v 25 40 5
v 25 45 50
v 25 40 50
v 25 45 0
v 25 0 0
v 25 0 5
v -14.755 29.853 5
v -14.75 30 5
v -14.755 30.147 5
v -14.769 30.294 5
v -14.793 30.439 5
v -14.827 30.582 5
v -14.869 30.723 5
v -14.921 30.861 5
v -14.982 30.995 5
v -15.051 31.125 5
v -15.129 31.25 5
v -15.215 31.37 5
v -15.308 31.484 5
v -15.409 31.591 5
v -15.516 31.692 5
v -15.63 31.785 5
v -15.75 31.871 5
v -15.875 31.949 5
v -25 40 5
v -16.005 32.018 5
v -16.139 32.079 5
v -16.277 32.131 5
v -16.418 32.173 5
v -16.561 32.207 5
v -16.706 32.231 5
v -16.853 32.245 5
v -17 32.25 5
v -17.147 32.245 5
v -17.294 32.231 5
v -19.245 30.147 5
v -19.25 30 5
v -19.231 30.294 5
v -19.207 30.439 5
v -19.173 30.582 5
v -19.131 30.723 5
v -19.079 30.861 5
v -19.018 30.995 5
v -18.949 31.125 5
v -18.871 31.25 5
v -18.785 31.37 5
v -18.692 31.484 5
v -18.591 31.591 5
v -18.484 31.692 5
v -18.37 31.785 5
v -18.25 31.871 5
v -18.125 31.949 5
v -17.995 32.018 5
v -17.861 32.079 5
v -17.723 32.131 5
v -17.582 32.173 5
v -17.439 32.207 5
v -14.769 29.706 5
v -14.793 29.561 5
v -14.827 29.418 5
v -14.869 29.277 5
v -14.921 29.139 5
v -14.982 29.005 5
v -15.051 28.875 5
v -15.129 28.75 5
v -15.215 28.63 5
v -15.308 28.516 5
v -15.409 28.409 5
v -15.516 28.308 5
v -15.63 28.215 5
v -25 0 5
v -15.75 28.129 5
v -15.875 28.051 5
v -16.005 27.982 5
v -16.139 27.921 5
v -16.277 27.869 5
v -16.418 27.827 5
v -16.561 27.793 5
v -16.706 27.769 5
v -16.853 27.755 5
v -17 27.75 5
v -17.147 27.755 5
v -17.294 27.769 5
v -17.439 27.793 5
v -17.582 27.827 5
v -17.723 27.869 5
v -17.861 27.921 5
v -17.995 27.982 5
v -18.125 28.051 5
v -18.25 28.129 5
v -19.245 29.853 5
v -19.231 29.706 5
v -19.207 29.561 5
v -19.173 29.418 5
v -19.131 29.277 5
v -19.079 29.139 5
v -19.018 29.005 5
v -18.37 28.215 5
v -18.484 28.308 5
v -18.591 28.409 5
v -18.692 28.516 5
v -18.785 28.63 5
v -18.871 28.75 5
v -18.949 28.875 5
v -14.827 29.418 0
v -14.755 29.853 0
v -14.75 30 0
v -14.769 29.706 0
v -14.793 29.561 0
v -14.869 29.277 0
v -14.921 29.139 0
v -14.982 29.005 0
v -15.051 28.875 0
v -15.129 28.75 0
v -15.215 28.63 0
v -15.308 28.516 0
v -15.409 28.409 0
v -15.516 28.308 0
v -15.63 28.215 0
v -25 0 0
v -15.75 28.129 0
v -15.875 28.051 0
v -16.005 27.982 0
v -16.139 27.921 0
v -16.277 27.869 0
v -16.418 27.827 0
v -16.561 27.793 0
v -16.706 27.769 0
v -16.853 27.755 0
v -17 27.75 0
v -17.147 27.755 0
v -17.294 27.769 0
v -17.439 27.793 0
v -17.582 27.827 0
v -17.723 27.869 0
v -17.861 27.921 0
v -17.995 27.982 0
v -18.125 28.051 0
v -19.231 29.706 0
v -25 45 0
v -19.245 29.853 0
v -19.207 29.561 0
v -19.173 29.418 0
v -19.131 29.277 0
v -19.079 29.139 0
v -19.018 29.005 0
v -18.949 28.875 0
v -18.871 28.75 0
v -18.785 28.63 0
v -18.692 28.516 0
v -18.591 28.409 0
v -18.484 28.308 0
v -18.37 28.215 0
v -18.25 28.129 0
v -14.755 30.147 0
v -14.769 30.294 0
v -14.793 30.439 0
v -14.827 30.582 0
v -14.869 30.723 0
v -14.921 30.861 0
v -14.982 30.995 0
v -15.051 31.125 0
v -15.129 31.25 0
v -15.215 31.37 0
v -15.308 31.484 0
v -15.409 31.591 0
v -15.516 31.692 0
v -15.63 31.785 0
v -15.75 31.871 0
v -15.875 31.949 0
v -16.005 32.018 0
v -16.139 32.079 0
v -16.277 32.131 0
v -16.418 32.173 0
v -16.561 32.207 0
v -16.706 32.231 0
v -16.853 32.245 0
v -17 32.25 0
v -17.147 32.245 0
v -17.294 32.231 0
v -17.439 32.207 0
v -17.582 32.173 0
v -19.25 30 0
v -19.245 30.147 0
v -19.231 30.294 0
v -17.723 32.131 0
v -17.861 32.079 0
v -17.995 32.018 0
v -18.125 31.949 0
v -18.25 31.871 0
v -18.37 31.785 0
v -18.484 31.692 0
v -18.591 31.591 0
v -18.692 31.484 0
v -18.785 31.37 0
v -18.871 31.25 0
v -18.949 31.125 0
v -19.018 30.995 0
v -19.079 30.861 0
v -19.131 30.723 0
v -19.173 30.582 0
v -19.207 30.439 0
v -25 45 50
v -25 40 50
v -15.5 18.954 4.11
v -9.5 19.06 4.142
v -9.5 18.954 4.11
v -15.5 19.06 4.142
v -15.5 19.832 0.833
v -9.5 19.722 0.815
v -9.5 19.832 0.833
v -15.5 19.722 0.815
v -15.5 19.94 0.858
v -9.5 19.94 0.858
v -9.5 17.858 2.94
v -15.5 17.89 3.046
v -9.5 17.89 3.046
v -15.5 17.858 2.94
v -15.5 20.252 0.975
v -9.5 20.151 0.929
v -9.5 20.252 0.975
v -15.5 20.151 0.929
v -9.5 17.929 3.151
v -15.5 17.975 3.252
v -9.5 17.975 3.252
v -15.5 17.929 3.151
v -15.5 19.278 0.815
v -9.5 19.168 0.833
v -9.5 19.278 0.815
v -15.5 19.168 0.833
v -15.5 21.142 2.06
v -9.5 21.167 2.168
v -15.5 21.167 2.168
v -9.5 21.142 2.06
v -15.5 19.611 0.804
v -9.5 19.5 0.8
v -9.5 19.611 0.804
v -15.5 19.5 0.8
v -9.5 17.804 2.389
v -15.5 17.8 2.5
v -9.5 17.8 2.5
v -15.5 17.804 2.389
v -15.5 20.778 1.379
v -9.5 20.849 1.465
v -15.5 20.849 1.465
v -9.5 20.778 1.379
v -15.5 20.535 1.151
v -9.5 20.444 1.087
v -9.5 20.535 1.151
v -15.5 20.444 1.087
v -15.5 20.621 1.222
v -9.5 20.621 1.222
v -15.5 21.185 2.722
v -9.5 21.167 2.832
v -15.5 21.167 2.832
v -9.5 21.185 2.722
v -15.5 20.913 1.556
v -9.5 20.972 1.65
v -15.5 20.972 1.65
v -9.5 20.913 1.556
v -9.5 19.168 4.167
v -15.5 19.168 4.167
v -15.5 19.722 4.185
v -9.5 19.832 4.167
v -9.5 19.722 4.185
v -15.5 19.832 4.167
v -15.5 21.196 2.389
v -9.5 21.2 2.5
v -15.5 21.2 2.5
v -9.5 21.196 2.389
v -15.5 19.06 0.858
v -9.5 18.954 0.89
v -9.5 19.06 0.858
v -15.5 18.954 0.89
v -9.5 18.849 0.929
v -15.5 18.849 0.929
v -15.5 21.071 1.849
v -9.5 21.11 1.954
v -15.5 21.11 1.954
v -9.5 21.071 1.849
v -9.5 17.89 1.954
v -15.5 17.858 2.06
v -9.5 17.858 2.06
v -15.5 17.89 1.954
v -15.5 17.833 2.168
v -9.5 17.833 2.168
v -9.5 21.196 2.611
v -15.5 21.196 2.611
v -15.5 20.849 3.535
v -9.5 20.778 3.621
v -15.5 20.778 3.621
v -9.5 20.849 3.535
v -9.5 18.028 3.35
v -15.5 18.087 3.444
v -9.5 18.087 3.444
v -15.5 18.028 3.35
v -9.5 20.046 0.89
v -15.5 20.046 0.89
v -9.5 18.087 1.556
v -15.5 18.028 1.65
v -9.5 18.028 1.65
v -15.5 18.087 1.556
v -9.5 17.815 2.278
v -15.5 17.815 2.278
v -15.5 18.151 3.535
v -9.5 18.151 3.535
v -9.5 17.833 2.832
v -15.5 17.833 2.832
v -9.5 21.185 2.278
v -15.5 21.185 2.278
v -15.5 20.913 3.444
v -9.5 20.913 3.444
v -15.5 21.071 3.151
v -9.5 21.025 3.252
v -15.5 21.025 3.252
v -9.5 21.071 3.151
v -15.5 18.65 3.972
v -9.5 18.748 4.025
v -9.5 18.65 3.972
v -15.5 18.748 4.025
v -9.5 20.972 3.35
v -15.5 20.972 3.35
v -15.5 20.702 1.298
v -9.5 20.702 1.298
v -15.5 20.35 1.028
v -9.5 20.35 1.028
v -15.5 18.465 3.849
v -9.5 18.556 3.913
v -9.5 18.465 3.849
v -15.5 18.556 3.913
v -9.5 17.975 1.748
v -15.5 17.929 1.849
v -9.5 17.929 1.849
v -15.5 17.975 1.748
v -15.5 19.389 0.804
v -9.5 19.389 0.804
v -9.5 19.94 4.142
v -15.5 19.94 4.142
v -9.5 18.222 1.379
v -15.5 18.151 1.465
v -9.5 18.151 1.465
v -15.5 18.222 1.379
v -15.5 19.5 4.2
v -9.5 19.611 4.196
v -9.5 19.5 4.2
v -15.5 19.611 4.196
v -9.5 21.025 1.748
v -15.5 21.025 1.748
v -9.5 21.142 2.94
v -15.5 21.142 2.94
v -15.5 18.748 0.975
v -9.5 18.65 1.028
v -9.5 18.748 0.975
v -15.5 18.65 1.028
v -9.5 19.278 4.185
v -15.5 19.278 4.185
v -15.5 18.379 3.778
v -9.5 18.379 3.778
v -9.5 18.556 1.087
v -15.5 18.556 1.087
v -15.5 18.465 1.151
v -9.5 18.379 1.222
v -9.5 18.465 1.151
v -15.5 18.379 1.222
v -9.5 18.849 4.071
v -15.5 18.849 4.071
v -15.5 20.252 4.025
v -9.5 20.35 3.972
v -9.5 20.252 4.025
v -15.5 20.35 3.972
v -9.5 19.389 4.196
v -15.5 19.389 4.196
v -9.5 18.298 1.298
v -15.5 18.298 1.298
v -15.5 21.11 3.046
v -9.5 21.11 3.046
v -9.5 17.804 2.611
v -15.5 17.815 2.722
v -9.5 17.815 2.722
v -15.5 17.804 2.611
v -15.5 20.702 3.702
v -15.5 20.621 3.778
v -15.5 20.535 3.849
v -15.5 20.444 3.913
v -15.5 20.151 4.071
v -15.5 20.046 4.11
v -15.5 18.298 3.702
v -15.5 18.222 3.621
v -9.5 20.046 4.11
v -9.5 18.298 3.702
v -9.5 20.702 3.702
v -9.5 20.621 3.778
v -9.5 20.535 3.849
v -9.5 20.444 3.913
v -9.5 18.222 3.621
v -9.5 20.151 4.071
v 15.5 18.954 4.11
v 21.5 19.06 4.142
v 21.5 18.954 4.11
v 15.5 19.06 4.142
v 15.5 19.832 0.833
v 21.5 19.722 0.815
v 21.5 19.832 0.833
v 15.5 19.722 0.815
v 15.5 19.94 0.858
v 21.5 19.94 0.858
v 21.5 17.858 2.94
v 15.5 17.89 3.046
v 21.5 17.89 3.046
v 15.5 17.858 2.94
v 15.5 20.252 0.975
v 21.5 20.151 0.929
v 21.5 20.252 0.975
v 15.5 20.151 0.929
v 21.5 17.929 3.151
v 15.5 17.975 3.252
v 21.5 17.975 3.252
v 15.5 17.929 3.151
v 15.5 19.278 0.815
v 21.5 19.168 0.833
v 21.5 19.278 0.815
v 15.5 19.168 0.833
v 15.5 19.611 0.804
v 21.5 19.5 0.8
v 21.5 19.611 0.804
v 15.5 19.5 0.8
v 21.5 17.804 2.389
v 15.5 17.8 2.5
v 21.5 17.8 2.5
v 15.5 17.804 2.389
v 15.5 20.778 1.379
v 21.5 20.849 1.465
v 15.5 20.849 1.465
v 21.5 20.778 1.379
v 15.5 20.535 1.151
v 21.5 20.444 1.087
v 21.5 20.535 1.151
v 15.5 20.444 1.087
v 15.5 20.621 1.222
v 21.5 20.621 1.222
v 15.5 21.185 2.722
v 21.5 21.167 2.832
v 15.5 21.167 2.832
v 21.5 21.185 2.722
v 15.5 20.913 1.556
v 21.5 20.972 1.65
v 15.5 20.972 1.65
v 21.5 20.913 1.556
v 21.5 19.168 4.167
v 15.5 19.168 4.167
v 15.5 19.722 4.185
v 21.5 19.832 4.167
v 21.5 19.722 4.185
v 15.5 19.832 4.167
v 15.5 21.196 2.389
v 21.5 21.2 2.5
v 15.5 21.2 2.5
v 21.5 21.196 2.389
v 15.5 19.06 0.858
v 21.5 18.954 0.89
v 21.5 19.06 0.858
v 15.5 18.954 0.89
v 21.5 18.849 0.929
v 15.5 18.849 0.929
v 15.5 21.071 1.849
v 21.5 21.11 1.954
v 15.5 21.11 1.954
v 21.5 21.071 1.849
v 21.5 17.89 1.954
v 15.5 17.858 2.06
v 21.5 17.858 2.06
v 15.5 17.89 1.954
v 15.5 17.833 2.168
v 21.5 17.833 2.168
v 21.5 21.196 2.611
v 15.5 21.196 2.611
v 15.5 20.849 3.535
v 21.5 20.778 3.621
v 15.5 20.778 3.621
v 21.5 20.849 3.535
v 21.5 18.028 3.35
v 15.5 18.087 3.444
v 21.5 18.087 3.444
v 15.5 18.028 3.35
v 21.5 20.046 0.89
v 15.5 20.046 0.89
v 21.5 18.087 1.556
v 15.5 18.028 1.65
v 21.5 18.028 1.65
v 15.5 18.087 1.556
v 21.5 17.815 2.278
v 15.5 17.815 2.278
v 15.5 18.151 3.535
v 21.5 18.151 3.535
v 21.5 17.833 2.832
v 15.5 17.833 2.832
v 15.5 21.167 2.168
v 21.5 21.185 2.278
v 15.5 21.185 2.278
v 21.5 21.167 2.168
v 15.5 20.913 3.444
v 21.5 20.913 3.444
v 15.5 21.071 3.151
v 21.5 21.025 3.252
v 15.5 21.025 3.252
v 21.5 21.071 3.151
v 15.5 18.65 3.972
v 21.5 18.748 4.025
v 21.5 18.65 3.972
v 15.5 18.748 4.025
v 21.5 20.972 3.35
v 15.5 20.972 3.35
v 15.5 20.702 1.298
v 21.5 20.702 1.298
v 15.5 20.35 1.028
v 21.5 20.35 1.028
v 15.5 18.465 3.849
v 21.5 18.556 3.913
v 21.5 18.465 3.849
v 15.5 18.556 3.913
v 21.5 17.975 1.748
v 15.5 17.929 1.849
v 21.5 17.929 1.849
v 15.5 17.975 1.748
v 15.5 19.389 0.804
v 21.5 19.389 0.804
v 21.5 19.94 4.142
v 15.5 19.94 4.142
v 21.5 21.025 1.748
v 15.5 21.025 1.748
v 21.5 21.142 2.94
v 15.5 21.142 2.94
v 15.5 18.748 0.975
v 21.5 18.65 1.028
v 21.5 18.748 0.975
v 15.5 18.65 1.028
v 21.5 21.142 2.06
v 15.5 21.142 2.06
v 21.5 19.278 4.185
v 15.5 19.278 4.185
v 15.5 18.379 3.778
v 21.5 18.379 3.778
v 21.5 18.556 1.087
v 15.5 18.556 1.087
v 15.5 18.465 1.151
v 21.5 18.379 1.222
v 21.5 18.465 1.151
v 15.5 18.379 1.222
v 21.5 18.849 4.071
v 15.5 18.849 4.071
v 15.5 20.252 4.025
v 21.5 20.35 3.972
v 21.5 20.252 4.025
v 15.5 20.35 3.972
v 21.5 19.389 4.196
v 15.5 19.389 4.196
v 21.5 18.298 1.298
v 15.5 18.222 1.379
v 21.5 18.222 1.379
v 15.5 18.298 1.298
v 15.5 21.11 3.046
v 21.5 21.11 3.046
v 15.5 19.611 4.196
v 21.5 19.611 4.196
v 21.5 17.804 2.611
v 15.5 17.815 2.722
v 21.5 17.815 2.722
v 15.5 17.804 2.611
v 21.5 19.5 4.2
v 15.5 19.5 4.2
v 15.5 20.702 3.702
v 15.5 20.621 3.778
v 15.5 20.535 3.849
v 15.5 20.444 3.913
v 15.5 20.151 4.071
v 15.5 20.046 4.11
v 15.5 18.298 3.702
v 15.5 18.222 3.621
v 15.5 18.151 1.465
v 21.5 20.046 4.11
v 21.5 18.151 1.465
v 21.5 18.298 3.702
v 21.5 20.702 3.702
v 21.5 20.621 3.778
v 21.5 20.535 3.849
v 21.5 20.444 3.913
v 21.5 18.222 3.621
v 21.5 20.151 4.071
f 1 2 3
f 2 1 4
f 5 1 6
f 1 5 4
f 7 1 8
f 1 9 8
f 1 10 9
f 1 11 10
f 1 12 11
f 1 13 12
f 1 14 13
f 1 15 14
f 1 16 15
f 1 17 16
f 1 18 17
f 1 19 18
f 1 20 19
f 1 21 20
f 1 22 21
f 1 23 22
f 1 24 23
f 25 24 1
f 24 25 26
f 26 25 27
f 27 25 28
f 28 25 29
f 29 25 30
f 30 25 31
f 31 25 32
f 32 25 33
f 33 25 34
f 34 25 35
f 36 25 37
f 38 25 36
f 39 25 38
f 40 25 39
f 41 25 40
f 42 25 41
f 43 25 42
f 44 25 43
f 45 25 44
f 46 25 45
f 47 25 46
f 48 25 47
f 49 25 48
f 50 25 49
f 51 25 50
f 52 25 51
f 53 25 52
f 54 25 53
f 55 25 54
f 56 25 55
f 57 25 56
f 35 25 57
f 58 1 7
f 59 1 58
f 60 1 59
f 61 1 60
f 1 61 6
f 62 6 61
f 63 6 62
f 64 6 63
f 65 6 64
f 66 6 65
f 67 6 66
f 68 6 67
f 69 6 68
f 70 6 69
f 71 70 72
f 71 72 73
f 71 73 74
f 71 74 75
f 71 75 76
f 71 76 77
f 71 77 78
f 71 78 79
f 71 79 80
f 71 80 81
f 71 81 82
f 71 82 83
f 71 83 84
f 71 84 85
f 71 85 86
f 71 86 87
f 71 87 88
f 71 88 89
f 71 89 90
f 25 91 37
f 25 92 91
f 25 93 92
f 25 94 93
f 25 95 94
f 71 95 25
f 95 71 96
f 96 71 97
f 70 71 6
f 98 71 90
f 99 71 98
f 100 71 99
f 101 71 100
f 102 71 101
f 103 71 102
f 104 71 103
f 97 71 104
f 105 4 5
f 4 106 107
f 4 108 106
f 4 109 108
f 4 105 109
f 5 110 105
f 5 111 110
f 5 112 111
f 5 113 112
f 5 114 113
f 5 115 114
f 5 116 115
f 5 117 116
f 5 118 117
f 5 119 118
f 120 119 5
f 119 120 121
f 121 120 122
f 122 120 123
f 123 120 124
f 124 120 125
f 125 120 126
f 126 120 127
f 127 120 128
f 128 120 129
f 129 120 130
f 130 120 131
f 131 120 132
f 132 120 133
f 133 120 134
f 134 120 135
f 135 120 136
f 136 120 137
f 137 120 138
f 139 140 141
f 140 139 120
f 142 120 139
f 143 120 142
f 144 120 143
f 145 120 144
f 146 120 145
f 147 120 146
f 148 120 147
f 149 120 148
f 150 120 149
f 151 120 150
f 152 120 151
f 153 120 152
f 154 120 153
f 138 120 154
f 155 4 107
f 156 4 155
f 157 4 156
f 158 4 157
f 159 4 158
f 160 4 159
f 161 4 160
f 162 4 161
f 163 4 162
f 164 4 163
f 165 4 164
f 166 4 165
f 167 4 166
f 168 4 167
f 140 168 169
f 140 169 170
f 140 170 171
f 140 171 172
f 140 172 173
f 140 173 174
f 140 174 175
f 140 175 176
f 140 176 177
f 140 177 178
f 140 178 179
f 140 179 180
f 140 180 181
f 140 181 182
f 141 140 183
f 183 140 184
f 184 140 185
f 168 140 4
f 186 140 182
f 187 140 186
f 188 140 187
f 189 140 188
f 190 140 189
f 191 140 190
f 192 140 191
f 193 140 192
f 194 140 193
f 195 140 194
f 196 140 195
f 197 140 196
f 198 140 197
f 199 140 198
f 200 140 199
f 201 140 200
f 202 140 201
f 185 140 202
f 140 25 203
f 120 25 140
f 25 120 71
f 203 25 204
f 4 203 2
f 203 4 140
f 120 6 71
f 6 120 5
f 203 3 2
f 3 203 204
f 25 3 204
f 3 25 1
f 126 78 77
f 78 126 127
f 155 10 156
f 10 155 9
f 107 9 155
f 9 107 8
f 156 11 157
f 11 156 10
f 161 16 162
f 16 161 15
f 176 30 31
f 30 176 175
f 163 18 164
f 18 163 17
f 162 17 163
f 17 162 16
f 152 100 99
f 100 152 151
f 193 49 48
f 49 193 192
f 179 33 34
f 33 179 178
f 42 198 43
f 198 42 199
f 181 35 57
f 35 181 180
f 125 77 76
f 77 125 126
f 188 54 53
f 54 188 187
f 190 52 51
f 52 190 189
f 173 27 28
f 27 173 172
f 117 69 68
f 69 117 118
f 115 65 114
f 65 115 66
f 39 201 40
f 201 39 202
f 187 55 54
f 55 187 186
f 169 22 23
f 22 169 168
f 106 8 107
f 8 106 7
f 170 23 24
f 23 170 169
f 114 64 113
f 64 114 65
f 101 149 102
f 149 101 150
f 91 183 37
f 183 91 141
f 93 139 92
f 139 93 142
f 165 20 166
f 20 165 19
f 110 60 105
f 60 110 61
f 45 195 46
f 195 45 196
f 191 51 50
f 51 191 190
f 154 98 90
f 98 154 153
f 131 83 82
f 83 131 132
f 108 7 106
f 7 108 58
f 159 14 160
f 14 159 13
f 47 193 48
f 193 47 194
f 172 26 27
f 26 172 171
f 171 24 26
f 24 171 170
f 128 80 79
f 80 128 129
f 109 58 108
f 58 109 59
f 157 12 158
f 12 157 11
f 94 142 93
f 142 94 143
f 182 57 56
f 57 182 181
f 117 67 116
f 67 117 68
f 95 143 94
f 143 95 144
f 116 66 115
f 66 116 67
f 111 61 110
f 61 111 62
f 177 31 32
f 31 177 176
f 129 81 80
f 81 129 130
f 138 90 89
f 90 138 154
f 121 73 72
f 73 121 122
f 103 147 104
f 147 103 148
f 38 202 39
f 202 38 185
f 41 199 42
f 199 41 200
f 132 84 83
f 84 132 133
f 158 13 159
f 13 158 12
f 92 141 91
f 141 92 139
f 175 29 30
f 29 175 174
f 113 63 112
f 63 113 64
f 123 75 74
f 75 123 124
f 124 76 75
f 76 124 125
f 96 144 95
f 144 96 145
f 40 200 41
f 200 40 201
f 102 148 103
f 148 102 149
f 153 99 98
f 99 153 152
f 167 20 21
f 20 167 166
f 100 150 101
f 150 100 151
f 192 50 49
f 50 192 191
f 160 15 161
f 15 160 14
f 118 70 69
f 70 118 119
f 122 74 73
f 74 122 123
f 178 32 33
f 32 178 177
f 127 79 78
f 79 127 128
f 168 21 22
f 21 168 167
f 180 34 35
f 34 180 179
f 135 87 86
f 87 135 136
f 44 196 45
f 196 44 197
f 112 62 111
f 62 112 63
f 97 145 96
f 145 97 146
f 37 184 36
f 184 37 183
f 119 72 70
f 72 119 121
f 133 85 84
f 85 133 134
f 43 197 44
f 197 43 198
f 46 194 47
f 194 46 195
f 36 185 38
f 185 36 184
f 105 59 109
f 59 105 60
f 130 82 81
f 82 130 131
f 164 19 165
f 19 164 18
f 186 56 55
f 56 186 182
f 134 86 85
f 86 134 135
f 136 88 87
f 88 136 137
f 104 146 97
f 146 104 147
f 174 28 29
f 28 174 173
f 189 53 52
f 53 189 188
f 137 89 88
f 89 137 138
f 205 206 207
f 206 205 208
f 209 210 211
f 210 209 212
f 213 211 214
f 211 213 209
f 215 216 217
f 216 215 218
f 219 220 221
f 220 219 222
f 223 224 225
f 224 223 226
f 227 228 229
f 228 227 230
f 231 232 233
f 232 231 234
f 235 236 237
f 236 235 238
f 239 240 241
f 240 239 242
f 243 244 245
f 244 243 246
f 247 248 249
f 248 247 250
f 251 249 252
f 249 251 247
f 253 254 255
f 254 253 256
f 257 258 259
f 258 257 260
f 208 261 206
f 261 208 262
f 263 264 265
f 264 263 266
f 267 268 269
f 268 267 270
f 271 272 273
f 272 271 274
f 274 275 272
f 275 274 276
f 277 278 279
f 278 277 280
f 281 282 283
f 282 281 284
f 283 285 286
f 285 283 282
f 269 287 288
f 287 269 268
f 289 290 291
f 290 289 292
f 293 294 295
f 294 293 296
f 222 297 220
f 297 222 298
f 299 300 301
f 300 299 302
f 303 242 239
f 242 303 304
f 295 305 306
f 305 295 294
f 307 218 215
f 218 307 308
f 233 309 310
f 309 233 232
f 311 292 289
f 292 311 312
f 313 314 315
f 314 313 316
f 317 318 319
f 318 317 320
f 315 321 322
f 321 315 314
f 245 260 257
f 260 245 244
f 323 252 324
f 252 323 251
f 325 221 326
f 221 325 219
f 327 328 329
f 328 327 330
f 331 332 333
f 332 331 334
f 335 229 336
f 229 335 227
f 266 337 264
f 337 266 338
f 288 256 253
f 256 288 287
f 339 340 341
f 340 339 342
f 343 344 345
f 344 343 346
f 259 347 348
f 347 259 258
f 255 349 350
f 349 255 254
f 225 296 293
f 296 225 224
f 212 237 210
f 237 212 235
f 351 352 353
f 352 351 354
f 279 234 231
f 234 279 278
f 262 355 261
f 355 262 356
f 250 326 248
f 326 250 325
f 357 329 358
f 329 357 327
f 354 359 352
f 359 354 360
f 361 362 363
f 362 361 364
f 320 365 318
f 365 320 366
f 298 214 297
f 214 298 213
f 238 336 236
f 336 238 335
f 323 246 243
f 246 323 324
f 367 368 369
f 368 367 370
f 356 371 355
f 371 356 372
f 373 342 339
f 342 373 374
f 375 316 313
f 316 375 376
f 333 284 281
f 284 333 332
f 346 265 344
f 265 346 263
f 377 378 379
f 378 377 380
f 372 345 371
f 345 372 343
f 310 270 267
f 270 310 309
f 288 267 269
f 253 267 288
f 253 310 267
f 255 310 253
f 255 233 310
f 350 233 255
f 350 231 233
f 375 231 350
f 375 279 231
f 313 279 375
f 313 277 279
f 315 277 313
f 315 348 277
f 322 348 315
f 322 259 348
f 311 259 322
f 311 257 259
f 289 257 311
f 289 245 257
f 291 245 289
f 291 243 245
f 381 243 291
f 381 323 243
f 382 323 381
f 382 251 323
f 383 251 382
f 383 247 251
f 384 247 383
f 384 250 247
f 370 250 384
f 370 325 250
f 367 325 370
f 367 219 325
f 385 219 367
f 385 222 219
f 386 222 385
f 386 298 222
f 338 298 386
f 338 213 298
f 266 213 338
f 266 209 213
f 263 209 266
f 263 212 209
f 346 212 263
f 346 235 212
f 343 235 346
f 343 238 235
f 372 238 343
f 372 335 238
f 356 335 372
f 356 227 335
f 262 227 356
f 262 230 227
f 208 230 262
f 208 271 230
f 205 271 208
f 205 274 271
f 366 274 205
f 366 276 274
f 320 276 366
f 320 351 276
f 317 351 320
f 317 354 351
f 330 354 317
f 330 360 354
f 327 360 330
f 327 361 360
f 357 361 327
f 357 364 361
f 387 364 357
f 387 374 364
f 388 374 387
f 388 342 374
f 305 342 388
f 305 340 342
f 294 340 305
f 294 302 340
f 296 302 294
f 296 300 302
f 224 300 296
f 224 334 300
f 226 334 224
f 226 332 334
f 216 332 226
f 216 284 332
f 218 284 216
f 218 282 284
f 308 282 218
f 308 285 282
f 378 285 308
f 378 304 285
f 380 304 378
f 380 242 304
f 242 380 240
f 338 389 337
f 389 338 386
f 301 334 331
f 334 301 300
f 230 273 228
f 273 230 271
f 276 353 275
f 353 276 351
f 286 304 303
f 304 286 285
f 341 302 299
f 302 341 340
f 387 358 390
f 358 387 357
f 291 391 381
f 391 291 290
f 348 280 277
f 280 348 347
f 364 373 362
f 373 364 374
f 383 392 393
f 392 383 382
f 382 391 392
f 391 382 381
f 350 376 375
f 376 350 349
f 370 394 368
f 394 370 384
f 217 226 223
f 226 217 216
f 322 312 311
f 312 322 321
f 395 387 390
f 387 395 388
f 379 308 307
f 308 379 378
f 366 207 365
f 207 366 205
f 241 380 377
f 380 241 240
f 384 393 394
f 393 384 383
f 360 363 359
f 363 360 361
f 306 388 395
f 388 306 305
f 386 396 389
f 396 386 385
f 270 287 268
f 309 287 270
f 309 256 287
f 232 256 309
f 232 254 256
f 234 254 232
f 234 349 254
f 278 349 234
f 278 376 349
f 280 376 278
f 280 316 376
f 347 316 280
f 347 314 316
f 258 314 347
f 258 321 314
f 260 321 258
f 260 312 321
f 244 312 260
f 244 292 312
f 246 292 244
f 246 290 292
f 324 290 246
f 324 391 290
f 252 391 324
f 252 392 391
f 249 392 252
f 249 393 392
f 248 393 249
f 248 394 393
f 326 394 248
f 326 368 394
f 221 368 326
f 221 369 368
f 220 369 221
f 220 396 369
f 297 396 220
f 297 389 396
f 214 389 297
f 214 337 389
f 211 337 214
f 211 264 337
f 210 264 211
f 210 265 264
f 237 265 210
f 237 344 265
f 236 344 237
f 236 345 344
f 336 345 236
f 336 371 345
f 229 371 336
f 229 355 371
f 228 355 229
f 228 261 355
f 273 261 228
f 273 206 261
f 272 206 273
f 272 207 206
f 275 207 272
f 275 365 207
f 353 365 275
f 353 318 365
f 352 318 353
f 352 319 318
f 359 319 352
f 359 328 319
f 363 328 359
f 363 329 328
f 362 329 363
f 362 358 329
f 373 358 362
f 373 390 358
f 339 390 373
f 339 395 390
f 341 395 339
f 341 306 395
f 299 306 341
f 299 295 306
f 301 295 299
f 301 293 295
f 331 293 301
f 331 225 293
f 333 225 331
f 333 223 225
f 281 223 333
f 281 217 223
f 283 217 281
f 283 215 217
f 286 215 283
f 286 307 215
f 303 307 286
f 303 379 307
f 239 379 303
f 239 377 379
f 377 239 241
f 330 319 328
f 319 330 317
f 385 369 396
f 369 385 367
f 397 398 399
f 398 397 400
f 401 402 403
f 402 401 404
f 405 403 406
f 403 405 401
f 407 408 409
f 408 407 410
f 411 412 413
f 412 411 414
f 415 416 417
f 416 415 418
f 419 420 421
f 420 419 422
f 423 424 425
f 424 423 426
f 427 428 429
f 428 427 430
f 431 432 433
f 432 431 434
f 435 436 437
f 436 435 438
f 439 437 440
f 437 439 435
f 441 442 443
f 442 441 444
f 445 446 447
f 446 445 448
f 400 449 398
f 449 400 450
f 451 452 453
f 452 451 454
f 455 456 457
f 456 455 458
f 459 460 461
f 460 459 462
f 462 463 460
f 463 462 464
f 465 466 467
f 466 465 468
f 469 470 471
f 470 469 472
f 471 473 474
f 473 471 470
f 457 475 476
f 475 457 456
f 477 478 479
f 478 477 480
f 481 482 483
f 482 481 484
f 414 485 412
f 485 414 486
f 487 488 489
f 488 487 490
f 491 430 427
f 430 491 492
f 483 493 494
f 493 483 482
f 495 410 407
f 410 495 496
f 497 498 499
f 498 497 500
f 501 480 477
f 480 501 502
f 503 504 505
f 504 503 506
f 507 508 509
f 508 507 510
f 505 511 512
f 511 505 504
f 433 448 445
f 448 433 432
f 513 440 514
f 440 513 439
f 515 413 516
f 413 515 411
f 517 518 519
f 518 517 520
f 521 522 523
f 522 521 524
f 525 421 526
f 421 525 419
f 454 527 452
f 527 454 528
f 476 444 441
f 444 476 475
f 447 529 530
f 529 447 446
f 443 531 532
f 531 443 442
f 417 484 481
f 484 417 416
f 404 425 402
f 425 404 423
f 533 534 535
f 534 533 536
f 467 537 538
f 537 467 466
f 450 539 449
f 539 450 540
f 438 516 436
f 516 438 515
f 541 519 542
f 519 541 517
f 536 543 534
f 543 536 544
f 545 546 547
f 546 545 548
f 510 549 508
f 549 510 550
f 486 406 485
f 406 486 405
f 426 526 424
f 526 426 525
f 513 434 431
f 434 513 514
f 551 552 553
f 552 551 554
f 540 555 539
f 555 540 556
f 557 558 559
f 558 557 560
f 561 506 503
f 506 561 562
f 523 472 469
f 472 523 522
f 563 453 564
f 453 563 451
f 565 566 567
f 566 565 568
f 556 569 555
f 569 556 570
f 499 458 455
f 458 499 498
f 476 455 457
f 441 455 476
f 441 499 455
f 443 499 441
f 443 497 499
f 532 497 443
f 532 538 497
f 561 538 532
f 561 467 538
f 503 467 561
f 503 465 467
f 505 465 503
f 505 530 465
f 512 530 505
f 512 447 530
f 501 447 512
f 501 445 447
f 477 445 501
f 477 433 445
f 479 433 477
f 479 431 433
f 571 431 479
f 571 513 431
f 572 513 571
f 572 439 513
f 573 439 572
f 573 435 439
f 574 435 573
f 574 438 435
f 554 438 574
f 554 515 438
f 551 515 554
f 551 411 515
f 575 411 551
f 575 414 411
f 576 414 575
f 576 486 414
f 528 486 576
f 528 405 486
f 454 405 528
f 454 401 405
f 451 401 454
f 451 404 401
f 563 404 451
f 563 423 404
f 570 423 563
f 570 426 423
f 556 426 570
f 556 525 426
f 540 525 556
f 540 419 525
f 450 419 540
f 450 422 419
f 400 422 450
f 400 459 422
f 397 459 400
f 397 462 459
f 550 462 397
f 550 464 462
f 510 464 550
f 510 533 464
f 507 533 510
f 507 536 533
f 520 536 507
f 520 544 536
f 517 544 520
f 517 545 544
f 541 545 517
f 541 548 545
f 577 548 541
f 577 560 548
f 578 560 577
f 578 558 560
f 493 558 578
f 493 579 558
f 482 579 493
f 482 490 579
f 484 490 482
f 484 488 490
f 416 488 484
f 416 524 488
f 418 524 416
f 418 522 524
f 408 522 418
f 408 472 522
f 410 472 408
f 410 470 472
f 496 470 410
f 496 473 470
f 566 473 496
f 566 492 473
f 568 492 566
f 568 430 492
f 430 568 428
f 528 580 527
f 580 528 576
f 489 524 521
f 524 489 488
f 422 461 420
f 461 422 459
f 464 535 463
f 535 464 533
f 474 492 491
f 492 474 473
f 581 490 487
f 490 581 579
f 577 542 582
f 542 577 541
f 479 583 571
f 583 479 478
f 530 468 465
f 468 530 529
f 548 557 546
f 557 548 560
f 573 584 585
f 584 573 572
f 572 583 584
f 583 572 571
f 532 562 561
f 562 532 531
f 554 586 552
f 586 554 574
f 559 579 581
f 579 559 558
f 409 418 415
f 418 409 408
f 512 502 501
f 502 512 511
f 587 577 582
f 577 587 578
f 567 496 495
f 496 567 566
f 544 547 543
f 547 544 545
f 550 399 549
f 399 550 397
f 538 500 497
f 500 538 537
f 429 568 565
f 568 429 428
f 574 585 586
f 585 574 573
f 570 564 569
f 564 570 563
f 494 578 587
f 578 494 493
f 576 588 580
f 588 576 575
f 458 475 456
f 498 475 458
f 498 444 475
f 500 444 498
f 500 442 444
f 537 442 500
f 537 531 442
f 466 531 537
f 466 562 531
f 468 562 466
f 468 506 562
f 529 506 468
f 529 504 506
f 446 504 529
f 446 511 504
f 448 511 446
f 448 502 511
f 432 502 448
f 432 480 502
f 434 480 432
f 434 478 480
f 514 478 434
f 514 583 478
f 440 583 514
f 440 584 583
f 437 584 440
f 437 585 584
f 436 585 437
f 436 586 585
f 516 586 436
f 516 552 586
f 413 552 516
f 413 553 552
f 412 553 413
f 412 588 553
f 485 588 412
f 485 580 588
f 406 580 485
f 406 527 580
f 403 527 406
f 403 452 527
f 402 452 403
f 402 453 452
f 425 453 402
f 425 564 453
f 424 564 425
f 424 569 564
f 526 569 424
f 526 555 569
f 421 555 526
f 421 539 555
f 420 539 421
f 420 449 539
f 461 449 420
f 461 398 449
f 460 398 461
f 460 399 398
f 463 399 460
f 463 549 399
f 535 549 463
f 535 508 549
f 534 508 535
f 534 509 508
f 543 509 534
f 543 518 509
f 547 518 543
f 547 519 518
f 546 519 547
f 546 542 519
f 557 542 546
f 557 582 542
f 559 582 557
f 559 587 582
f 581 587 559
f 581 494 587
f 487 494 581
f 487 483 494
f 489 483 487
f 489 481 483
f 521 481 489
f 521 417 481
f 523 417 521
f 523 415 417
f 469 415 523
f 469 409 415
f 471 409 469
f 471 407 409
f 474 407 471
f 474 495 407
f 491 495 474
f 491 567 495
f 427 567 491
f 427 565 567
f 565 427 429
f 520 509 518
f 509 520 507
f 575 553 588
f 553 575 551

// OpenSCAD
// L-shaped mounting bracket for NEMA 17 stepper motor (syringe pump)
// Print orientation: base plate on bed, motor plate builds upward (+Z)

// ---------------- Parameters ----------------
plate_x      = 25;    // base plate half-width (X)
plate_y      = 45;    // base plate length (Y)
plate_t      = 5;     // base plate thickness (Z)

motor_h      = 50;    // motor plate height (Z)
motor_w      = 5;     // motor plate thickness (Y)

boss_d       = 23;    // motor boss hole diameter
boss_x       = 0;     // boss hole centre X
boss_z       = 28;    // boss hole centre Z

screw_d      = 3.4;   // M3 screw hole diameter
screw_p      = 31;    // square pattern side length
screw_n      = 4;     // number of screw holes

gusset_t     = 5;     // gusset thickness (X)
gusset_y     = 20;    // gusset leg along +Y
gusset_z     = 20;    // gusset leg along +Z

eps          = 0.5;   // cutter overshoot past faces

$fn = 96;

// ---------------- Model ----------------
difference() {
    union() {
        // Base plate
        translate([-plate_x, 0, 0])
            cube([plate_x * 2, plate_y, plate_t]);

        // Motor plate (stands on back edge of base)
        translate([-plate_x, plate_y - motor_w, 0])
            cube([plate_x * 2, motor_w, motor_h]);

        // Left gusset: right triangle in YZ, flush with left edge
        // rotate([90,0,0]) maps polygon X -> world Y, polygon Y -> world Z
        translate([-plate_x - gusset_t, plate_y - motor_w, 0])
            rotate([90, 0, 0])
                linear_extrude(height = gusset_t)
                    polygon(points = [
                        [motor_w - gusset_t, gusset_y],
                        [motor_w - gusset_t, gusset_z],
                        [motor_w,           gusset_y]
                    ]);

        // Right gusset: right triangle in YZ, flush with right edge
        translate([plate_x + gusset_t, plate_y - motor_w, 0])
            rotate([90, 0, 0])
                linear_extrude(height = gusset_t)
                    polygon(points = [
                        [motor_w - gusset_t, gusset_y],
                        [motor_w - gusset_t, gusset_z],
                        [motor_w,           gusset_y]
                    ]);
    }

    // Base plate through-holes (M4)
    for (h = [-1, 1])
        translate([-17, 30, -eps * h])
            cylinder(d = 4.5, h = plate_t + 2 * eps * h);

    // Motor boss hole (along Y)
    translate([boss_x, plate_y / 2 - eps, boss_z])
        rotate([0, 90, 0])
            cylinder(d = boss_d, h = motor_w + 2 * eps);

    // M3 screw holes on square pattern, centred on boss hole
    for (i = [0 : screw_n - 1]) {
        a = (i - (screw_n - 1) / 2) * screw_p;
        translate([a, plate_y / 2 - motor_w / 2 - eps,
                   boss_z - motor_h / 2 - eps])
            rotate([0, 90, 0])
                cylinder(d = screw_d, h = motor_w + 2 * eps);
    }
}
